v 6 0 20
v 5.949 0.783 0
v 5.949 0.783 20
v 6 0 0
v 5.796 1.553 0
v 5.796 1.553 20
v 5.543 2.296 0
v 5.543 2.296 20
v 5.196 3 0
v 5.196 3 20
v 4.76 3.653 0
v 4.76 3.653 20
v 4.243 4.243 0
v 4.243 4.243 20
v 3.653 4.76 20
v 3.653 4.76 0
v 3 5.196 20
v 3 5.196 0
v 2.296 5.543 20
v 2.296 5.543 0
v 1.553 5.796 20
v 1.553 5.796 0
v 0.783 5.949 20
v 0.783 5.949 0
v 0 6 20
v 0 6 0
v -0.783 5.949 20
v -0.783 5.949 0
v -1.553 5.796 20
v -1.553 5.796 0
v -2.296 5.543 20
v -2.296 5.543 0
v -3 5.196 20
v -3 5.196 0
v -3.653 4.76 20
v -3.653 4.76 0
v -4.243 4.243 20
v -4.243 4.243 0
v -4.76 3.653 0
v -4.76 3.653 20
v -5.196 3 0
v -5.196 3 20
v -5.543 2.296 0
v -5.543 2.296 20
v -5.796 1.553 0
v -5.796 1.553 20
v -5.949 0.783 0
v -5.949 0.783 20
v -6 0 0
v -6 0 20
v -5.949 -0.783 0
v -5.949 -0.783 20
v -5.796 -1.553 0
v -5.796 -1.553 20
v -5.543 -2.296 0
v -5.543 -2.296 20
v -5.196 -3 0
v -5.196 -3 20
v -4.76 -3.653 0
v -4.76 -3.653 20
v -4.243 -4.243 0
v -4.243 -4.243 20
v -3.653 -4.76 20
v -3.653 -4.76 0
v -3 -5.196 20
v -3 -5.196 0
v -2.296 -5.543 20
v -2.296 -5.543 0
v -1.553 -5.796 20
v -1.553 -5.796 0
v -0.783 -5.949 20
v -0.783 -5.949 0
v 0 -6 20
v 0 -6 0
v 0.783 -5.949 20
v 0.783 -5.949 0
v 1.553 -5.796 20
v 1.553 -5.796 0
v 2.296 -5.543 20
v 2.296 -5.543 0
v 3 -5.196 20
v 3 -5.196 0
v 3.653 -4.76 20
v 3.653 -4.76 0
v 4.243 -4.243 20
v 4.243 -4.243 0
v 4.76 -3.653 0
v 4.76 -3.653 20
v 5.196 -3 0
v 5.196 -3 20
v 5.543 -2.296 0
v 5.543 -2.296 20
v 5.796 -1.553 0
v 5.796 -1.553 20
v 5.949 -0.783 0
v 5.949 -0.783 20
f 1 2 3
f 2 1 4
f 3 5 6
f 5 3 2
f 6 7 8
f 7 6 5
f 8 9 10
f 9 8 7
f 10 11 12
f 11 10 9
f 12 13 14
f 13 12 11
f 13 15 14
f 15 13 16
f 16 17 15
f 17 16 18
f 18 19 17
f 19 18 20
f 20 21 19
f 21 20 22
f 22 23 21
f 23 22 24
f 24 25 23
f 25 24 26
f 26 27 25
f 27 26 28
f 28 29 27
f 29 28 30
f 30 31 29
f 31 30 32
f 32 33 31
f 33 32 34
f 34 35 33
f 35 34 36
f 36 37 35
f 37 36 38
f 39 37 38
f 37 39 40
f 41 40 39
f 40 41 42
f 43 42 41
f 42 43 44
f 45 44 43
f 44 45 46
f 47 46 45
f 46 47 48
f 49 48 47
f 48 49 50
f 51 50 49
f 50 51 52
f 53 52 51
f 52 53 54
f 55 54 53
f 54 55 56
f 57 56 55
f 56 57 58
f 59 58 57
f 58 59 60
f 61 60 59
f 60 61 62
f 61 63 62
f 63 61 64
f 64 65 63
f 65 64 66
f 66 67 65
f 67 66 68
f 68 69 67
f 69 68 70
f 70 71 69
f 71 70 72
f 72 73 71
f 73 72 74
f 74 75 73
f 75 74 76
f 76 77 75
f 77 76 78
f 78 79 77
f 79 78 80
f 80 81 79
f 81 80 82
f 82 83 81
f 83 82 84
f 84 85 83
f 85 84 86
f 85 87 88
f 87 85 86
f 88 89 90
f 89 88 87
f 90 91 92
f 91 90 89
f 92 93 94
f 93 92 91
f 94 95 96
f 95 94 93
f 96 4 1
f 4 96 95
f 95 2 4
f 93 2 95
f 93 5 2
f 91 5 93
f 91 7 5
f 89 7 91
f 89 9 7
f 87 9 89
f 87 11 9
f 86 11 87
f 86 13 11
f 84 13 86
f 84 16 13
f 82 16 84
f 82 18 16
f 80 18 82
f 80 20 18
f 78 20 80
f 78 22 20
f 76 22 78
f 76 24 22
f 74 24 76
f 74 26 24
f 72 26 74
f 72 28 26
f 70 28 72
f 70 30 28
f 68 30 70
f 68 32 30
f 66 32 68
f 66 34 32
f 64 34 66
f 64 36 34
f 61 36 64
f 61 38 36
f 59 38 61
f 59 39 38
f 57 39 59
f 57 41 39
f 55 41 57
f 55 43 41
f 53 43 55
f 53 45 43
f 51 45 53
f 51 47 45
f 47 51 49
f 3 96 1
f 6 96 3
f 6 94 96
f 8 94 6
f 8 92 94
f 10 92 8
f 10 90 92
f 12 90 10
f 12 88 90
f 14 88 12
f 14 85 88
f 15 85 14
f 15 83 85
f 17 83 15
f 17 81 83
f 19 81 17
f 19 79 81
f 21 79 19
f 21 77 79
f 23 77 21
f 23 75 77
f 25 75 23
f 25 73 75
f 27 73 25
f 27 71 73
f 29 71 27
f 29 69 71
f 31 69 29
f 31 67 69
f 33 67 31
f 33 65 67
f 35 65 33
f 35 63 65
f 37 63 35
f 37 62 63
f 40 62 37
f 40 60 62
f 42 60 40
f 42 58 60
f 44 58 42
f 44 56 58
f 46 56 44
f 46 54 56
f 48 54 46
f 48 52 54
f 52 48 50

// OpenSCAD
// Construct: cylinder() with a single radius (straight tube).
cylinder(h = 20, r = 6, $fn = 48);
